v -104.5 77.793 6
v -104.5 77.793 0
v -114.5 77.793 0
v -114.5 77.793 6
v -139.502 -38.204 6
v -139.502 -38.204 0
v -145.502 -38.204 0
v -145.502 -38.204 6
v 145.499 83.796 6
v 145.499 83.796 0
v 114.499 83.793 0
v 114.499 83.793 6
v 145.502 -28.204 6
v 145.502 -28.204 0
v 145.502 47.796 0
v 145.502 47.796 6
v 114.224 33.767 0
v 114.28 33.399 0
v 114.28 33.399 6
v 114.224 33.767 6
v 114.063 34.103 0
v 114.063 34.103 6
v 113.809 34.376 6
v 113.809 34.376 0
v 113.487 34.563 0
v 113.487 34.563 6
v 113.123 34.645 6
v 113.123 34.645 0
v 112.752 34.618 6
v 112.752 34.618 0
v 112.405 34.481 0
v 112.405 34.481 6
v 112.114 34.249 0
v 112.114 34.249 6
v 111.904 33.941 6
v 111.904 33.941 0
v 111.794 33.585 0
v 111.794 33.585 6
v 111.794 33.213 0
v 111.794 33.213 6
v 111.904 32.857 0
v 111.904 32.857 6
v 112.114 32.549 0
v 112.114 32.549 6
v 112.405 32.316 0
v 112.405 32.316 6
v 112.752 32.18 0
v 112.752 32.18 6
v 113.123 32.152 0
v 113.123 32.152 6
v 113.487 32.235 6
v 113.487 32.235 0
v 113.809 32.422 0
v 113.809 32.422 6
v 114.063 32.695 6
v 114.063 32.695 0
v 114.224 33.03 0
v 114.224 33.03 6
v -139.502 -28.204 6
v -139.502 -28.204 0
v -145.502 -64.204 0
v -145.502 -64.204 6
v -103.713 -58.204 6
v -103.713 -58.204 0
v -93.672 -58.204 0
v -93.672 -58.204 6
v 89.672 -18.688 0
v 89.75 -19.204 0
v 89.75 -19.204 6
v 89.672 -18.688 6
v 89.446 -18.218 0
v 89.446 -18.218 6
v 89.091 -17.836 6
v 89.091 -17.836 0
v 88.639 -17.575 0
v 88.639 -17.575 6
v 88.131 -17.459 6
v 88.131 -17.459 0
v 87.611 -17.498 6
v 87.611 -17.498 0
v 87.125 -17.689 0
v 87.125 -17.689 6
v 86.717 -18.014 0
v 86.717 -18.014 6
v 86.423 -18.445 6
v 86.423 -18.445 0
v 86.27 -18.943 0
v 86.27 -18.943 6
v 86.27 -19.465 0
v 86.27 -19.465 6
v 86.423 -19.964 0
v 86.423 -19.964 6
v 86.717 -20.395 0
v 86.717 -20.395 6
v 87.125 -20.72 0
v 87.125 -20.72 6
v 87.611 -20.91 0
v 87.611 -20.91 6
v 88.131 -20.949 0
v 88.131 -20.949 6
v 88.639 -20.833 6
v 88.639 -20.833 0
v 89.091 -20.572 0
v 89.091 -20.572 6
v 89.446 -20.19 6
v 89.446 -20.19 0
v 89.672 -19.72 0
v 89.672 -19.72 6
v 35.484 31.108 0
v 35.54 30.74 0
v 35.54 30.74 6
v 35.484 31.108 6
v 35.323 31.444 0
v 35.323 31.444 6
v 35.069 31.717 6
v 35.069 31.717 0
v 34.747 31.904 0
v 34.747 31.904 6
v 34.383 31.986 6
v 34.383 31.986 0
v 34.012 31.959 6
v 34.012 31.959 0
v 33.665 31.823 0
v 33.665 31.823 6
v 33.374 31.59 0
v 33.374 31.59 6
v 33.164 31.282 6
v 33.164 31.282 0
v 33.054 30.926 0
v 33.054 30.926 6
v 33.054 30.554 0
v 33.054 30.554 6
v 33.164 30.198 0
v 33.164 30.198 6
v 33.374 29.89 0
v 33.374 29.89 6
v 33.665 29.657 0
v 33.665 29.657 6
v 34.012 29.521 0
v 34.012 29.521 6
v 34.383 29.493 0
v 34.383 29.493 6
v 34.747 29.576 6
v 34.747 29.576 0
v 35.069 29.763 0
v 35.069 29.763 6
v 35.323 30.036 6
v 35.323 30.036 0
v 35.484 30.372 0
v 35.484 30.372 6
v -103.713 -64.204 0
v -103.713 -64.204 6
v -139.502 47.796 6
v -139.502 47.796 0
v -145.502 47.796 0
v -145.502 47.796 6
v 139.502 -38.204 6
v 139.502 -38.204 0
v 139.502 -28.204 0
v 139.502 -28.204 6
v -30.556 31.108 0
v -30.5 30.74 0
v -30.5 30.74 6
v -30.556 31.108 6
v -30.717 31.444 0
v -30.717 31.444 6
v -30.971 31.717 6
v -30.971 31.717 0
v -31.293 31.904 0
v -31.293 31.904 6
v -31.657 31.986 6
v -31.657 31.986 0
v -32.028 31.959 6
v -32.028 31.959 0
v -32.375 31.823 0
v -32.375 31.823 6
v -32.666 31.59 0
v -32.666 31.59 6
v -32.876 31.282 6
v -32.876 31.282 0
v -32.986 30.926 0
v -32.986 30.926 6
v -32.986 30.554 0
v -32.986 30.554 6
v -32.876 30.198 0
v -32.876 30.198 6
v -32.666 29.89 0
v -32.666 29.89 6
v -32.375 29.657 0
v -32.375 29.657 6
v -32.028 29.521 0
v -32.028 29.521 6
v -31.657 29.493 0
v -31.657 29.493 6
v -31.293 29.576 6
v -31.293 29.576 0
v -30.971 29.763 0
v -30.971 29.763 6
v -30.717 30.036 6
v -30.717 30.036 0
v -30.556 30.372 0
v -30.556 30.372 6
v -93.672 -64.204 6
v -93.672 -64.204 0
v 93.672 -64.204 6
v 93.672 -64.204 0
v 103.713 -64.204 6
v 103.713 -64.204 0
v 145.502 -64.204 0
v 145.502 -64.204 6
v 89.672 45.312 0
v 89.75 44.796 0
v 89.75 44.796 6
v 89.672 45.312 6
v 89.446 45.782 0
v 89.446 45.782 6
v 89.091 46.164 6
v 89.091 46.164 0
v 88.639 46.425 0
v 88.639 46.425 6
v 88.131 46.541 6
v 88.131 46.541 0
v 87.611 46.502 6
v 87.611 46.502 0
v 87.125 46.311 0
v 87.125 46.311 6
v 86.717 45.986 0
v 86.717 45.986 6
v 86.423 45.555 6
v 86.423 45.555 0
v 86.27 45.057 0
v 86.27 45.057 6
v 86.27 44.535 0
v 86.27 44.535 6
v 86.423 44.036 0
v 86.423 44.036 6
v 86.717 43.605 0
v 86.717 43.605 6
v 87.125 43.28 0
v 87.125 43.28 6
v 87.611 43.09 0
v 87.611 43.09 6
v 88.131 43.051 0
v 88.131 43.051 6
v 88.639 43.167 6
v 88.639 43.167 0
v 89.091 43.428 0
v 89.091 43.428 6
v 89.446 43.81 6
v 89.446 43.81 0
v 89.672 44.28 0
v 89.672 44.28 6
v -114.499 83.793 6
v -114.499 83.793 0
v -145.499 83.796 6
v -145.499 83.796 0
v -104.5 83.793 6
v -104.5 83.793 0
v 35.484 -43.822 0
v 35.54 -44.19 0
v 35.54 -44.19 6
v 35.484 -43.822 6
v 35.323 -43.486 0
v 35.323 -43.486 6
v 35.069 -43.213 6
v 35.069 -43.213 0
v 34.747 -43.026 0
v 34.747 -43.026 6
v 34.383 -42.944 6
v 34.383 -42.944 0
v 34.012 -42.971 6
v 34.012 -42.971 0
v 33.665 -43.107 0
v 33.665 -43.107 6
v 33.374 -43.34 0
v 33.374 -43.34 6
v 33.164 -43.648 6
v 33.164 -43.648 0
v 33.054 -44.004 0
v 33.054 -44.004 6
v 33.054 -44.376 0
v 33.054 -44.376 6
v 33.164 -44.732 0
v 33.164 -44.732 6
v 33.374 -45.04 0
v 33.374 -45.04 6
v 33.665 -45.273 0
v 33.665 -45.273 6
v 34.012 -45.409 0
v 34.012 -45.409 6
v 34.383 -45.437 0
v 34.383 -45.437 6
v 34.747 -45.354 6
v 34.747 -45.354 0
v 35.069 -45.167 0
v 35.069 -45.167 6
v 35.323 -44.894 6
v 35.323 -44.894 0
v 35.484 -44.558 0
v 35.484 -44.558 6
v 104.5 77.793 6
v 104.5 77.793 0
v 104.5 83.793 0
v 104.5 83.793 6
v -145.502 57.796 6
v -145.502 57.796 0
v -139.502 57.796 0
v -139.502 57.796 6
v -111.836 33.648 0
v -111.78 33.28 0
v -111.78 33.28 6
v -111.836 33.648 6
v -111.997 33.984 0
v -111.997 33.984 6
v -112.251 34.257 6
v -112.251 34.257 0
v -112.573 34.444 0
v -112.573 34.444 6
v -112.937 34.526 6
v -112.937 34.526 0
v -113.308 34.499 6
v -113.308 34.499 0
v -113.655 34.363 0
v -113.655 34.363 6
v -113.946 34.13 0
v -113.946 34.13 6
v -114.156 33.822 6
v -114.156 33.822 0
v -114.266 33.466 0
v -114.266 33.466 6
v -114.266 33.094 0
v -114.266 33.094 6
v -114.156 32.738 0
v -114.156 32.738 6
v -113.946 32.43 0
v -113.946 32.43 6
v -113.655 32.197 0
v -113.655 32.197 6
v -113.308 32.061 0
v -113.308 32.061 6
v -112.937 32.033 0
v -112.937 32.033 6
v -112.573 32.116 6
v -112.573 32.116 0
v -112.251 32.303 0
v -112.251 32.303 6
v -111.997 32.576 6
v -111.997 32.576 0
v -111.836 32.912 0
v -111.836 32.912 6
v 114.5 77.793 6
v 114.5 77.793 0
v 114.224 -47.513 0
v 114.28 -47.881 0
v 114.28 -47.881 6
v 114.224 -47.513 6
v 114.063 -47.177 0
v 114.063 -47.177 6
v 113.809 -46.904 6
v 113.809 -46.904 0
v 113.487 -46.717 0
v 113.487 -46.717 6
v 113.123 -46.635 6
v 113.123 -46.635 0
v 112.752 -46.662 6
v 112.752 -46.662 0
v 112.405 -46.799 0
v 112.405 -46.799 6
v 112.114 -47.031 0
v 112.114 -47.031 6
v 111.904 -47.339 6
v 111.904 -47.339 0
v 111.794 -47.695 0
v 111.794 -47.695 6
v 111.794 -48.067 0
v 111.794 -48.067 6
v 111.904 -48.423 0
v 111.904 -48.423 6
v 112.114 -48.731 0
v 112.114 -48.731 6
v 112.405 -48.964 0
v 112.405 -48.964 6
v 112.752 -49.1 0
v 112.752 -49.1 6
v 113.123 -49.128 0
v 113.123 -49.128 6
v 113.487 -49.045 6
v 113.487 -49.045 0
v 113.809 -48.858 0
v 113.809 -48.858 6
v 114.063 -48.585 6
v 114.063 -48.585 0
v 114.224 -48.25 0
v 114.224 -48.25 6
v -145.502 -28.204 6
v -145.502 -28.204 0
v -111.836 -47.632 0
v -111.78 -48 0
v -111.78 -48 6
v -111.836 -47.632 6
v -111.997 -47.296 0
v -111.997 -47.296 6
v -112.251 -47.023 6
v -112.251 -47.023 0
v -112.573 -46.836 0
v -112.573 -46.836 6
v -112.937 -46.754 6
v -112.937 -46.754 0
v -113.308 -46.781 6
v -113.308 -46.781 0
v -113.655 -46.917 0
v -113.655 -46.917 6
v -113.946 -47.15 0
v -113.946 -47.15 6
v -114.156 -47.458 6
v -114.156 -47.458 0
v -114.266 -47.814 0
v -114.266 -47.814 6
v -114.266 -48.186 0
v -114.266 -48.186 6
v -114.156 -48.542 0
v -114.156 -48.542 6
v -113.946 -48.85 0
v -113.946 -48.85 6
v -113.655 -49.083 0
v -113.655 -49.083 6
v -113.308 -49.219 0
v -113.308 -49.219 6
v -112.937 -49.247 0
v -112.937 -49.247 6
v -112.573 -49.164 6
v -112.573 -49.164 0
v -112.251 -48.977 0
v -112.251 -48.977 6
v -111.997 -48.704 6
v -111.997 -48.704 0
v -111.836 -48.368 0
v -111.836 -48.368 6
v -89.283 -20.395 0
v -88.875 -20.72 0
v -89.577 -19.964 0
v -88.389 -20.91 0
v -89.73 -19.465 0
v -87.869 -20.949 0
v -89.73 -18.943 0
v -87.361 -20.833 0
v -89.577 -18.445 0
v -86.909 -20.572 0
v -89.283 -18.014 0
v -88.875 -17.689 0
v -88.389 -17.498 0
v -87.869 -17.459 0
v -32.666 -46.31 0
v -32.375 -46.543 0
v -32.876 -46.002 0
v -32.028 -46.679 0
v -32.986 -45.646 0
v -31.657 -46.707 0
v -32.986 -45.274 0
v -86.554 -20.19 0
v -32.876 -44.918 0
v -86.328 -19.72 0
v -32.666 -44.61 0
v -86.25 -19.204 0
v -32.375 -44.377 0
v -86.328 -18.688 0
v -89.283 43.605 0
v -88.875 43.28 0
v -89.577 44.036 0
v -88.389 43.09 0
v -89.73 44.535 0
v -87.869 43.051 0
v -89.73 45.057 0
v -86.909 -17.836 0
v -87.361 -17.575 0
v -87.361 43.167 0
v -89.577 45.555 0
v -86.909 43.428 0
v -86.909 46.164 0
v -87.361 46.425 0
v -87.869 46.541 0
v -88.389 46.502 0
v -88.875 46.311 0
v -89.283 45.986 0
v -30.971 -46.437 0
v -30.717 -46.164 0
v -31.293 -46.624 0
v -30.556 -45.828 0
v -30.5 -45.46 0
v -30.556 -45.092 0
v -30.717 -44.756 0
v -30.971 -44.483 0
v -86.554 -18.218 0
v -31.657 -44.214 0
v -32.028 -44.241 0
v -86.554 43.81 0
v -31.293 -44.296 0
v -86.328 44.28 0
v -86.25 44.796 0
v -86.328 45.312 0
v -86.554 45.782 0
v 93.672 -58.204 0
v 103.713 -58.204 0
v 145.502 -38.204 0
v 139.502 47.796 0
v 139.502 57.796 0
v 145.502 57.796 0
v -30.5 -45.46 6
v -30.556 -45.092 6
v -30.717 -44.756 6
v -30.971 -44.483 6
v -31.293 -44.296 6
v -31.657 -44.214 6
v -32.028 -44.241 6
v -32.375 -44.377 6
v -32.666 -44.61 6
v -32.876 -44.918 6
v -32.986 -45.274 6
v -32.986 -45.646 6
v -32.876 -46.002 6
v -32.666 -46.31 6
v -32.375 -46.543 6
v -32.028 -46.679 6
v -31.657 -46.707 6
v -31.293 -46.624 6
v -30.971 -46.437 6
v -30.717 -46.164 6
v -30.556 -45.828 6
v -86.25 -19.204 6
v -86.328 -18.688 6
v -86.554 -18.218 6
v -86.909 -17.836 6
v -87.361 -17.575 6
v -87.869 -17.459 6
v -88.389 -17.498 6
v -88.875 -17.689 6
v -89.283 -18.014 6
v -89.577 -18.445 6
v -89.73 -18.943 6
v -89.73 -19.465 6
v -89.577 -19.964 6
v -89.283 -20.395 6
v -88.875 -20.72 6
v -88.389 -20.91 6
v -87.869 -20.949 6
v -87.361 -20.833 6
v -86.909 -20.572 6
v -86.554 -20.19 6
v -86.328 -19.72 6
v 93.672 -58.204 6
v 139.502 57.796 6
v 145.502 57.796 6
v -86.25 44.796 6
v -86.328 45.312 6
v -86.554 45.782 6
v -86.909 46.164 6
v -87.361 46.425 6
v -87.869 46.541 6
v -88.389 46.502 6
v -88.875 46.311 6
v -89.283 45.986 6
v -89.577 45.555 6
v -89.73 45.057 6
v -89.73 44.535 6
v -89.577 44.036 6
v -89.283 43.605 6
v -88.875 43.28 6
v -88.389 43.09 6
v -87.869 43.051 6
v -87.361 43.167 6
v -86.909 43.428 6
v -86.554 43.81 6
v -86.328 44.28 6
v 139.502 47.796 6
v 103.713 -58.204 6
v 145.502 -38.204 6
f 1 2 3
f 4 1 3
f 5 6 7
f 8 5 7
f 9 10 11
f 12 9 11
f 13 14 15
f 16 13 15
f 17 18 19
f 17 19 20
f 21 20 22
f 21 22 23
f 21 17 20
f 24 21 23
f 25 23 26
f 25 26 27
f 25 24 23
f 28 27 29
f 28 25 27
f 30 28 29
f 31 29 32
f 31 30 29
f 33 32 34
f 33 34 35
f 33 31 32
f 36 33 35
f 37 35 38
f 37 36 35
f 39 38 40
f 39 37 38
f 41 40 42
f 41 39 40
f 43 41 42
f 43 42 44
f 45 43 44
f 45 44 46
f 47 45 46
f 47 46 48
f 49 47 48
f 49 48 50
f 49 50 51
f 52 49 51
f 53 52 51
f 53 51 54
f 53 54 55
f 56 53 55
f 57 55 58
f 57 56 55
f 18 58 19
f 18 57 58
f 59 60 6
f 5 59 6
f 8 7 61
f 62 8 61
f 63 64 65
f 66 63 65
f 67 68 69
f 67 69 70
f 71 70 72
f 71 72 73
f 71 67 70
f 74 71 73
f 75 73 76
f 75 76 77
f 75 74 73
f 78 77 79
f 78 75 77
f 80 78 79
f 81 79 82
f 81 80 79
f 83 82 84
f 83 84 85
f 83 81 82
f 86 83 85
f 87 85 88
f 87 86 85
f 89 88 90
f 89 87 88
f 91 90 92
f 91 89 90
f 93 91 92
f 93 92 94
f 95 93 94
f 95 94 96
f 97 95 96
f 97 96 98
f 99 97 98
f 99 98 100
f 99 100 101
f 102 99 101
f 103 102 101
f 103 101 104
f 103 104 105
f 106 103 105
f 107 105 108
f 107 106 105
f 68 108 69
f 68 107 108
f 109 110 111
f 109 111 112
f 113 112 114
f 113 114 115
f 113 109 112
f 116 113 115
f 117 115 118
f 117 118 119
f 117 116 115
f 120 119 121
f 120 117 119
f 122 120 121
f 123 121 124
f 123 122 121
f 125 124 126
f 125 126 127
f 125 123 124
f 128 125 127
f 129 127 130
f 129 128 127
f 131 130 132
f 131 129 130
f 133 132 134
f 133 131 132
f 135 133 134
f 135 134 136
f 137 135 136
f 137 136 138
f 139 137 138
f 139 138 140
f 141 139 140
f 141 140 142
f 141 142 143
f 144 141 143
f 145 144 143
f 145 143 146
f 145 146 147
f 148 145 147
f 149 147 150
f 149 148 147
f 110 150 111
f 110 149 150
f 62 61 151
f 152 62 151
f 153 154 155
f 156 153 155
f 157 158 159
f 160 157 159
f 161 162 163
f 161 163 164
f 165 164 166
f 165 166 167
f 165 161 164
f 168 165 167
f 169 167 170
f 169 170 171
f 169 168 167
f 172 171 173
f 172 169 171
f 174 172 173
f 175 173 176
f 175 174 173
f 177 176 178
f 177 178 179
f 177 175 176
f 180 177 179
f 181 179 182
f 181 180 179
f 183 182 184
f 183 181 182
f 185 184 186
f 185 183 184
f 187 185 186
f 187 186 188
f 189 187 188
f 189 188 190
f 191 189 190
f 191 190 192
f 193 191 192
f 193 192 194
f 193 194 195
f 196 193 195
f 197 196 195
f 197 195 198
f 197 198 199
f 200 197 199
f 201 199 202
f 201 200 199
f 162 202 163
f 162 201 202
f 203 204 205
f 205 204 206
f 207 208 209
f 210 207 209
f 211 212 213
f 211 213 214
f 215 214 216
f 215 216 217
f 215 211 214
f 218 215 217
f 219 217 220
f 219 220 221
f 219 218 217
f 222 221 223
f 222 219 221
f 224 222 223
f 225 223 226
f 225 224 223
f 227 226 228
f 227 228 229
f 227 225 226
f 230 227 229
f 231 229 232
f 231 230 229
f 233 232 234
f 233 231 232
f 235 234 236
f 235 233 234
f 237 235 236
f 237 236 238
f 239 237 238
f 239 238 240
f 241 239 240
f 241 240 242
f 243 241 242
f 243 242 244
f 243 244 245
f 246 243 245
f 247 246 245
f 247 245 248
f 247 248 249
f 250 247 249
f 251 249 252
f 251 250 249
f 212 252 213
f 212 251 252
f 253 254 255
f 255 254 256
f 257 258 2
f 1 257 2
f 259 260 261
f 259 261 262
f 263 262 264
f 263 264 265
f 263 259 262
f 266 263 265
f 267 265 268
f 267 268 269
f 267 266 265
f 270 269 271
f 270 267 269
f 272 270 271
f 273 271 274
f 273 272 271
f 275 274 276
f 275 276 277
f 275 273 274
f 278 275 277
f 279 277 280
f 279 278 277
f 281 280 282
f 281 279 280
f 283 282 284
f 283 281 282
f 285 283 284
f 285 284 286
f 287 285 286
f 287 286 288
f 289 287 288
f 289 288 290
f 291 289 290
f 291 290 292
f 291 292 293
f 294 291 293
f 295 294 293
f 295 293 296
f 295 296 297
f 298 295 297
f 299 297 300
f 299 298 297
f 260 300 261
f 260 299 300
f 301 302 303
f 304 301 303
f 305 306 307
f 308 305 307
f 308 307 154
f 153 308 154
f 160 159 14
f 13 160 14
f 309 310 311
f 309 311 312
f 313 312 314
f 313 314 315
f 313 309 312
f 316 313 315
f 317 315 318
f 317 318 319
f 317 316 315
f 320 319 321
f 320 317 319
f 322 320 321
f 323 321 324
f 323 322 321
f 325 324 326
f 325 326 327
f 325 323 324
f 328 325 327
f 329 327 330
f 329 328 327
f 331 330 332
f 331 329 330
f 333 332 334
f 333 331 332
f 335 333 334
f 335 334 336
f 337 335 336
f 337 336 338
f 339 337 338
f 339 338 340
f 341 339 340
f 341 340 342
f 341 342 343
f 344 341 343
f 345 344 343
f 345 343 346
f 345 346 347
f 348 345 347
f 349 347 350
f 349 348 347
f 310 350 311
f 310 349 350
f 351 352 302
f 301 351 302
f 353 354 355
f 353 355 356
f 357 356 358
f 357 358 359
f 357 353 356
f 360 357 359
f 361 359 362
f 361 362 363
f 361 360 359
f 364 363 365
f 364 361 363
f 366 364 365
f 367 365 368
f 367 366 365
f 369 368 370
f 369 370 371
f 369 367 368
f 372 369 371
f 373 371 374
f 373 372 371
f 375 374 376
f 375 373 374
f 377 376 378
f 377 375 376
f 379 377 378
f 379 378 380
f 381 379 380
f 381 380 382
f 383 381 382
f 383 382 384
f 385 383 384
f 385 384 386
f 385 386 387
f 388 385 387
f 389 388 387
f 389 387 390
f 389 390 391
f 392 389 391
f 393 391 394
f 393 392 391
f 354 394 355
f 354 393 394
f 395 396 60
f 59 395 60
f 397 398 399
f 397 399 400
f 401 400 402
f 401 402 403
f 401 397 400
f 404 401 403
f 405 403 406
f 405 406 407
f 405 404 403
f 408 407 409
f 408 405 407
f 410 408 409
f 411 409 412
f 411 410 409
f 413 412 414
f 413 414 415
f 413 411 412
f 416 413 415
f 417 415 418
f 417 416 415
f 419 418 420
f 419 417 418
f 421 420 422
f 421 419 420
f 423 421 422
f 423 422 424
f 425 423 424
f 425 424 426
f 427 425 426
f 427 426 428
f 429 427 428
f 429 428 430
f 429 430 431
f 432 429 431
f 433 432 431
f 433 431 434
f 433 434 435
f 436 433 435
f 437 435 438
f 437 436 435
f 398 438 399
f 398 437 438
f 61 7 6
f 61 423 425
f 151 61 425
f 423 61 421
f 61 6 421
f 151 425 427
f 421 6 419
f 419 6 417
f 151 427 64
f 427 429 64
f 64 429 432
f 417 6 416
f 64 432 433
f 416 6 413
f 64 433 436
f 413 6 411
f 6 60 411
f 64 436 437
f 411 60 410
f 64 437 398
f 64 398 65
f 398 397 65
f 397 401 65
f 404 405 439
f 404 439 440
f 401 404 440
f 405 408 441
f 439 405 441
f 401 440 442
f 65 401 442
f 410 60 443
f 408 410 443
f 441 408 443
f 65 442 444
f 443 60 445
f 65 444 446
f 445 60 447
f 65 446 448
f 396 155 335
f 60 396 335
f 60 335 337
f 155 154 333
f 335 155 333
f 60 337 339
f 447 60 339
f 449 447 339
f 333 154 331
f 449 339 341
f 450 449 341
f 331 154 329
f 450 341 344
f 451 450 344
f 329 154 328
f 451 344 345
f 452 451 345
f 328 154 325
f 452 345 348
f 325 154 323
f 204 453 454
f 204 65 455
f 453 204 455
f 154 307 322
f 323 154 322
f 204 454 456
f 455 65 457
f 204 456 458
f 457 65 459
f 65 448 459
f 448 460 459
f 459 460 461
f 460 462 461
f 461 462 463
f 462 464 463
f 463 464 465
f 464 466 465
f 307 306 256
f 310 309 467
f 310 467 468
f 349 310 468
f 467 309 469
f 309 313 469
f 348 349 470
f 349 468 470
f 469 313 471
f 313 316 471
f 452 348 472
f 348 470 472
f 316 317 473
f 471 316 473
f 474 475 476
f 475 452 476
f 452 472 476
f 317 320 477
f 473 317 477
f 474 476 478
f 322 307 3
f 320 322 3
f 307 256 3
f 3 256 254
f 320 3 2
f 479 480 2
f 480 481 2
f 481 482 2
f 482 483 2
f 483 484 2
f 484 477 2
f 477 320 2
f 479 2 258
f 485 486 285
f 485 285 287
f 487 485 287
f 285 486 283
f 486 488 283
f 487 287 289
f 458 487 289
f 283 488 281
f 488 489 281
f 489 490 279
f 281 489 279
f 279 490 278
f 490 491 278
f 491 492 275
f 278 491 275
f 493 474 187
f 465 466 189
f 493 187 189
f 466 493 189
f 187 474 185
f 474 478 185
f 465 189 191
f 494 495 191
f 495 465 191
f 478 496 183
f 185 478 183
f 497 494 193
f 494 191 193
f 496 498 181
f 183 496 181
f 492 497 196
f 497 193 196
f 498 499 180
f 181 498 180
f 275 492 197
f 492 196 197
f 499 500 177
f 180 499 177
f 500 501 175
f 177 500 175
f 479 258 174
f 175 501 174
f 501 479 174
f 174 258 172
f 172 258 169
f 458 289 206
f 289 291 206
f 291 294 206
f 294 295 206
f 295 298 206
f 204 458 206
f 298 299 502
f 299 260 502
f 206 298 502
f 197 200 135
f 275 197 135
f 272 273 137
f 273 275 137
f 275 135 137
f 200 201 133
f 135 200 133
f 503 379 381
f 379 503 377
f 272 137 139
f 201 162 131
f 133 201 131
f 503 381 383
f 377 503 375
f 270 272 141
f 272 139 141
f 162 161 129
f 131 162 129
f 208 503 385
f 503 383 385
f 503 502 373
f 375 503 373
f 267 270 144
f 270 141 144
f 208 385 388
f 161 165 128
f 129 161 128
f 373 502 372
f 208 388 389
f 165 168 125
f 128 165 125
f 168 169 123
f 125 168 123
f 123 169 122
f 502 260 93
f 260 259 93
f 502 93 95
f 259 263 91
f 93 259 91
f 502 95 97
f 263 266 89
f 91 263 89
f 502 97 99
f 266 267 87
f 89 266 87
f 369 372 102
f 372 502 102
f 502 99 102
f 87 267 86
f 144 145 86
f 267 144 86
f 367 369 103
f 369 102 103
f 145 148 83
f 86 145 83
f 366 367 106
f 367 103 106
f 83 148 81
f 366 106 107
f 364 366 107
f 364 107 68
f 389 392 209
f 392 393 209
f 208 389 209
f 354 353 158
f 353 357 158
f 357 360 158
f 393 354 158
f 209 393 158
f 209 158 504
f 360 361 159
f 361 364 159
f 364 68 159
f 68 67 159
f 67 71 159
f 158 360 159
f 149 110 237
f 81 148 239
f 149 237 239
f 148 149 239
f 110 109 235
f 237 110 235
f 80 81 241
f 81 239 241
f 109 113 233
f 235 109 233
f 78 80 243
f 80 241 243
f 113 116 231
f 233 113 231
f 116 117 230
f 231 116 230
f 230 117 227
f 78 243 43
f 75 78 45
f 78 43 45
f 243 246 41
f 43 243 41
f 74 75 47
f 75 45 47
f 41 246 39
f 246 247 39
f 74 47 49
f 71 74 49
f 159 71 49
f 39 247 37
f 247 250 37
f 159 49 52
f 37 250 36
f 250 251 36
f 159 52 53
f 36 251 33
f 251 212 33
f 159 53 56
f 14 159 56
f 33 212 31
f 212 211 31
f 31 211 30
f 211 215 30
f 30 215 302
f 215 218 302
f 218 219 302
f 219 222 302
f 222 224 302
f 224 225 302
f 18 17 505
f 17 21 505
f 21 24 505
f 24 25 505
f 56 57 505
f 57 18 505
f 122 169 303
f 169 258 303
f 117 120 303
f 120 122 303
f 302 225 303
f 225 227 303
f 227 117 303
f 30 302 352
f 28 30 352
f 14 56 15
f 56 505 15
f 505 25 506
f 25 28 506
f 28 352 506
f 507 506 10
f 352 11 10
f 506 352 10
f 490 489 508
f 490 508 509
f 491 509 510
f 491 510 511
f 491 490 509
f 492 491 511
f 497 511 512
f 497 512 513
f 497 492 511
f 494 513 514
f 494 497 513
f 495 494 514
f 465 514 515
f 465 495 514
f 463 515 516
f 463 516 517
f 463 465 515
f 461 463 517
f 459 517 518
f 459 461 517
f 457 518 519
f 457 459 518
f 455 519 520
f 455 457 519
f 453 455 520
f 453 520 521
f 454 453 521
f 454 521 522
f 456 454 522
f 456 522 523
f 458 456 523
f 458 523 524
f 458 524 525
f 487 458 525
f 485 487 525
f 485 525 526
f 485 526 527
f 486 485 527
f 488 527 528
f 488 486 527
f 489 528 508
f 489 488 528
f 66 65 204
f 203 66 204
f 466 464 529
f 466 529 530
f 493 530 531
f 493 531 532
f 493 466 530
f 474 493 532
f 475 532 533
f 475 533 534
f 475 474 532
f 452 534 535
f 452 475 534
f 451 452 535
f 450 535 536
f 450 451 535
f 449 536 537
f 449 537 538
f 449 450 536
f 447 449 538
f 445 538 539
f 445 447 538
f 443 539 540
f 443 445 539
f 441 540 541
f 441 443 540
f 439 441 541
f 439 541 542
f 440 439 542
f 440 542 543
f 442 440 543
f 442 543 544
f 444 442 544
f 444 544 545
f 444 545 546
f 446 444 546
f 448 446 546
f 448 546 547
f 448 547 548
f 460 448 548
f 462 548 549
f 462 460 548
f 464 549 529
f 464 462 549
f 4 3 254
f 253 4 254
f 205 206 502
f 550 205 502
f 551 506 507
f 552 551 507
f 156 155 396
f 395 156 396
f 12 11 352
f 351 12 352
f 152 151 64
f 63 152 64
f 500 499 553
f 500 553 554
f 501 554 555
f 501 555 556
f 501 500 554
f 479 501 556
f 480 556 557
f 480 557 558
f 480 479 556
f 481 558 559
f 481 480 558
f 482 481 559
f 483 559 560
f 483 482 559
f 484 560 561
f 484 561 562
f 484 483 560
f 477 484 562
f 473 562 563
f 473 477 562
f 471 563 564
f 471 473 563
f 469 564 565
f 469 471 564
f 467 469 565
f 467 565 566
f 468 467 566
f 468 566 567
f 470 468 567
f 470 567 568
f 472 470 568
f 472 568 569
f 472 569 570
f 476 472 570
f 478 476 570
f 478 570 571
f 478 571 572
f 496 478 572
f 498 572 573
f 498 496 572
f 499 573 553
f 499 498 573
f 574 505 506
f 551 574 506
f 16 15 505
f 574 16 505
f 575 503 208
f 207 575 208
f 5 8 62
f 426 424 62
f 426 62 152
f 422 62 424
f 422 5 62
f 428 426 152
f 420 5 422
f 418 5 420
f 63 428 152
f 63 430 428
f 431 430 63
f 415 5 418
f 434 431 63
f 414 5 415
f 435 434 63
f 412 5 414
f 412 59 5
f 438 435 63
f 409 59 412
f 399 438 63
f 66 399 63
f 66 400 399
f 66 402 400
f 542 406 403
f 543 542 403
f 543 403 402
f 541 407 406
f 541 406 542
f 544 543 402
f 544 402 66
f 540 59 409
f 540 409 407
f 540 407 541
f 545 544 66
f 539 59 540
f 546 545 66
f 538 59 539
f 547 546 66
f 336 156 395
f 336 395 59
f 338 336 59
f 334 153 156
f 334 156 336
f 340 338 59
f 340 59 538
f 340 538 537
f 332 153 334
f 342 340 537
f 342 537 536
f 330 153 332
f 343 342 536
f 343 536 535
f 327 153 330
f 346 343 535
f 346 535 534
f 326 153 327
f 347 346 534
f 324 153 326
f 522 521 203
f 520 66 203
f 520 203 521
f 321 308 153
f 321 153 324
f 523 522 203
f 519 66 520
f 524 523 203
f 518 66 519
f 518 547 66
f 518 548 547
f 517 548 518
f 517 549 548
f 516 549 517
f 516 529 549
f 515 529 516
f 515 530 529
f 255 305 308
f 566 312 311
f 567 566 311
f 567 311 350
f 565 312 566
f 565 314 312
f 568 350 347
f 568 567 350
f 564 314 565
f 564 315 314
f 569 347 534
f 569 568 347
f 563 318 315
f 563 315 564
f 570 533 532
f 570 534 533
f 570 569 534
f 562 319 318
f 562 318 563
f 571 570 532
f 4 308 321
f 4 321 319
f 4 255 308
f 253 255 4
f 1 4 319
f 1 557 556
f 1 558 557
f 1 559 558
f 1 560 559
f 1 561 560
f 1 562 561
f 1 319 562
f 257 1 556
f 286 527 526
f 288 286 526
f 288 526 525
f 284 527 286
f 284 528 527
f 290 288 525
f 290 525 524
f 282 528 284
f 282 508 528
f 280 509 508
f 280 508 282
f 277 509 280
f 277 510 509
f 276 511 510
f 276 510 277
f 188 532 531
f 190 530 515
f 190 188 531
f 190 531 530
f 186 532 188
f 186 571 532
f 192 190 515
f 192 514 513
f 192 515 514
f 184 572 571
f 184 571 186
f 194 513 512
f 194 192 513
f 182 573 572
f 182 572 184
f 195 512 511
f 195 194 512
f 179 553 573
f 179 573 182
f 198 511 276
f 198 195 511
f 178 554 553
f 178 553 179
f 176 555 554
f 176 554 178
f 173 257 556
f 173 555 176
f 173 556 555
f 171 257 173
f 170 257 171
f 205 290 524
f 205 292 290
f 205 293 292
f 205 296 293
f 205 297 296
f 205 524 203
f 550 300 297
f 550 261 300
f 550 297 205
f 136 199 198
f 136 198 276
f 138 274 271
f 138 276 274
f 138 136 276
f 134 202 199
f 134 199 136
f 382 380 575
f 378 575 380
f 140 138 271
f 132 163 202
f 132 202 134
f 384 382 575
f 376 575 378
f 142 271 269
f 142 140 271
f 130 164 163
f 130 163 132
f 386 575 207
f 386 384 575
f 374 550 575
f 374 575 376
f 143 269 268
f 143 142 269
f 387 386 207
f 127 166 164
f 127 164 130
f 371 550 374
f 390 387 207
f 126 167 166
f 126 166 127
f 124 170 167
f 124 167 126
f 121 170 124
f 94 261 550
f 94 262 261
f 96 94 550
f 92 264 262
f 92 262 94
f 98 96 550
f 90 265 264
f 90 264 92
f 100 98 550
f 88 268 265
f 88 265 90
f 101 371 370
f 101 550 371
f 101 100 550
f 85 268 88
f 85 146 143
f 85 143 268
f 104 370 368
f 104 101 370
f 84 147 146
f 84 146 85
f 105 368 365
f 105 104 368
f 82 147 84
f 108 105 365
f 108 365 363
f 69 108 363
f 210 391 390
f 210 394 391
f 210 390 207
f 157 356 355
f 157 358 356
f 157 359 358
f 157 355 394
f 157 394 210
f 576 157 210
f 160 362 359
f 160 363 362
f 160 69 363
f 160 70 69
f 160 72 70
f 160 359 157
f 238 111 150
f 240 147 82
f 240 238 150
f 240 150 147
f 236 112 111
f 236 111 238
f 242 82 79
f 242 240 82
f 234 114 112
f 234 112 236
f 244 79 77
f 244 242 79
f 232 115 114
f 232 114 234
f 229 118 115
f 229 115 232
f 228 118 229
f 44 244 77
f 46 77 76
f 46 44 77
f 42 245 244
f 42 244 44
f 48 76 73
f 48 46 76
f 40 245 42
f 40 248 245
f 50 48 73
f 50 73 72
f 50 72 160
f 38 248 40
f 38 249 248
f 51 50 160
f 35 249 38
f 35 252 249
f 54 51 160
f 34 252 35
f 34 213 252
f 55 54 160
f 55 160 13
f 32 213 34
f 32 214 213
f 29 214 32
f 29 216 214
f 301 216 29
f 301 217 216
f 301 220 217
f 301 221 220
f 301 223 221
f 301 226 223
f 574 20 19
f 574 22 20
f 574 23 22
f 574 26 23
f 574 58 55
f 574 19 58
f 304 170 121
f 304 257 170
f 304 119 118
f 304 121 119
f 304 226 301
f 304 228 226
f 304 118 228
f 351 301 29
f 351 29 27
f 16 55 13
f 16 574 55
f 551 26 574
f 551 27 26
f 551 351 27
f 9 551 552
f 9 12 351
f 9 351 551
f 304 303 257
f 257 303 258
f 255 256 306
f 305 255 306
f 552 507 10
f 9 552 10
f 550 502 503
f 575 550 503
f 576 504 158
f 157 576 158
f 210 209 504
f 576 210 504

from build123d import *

# Parameters (mm, degrees)
F0_R     = 1.25
F0_R_2   = 1.75
F1_DEPTH = 6


# Not quite as in the source:
# - a feature names something its author has since deleted; it is built from what else it names


with BuildPart() as f1:
    # F0 (on Top) → F1 (new body)
    with BuildSketch(Plane.XY):
        Polygon((145.5019380654, -28.2040820618), (145.5019380654, 47.7959179382), (139.5019380654, 47.7959179382), (139.5019380654, 57.7961117593), (145.5019380654, 57.7961117593), (145.4994183911, 83.7961116372), (114.4994185367, 83.7931074102), (114.5, 77.7931074384), (104.5, 77.7931074384), (104.5, 83.793107429), (0, 83.793107429), (-104.5, 83.793107429), (-104.5, 77.7931074384), (-114.5, 77.7931074384), (-114.4994185367, 83.7931074102), (-145.4994183911, 83.7961116372), (-145.5019380654, 57.7961117593), (-139.5019380654, 57.7961117593), (-139.5019380654, 47.7959179382), (-145.5019380654, 47.7959179382), (-145.5019380654, -28.2040820618), (-139.5019380654, -28.2040820618), (-139.5019380654, -38.2040820618), (-145.5019380652, -38.2041248082), (-145.5019380652, -64.2040820618), (-103.7128691326, -64.2040817458), (-103.7128691326, -58.2040817458), (-93.6722421218, -58.2040816699), (-93.6722421218, -64.2042880704), (-4.2916e-06, -64.2042880704), (93.6722421218, -64.2042880704), (93.6722421218, -58.2040816699), (103.7128691326, -58.2040817458), (103.7128691326, -64.2040817458), (145.5019380652, -64.2040820618), (145.5019380652, -38.2041248082), (139.5019380654, -38.2040820618), (139.5019380654, -28.2040820618), align=None)
        with Locations((-113.03, -48.0000058421)):
            Circle(F0_R, mode=Mode.SUBTRACT)
        with Locations((-31.75, -45.4600058421)):
            Circle(F0_R, mode=Mode.SUBTRACT)
        with Locations((-88, -19.2042880704)):
            Circle(F0_R_2, mode=Mode.SUBTRACT)
        with Locations((34.29, -44.1900058421)):
            Circle(F0_R, mode=Mode.SUBTRACT)
        with Locations((113.03, -47.8810681991)):
            Circle(F0_R, mode=Mode.SUBTRACT)
        with Locations((88, -19.2042880704)):
            Circle(F0_R_2, mode=Mode.SUBTRACT)
        with Locations((-113.03, 33.2799941579)):
            Circle(F0_R, mode=Mode.SUBTRACT)
        with Locations((-88, 44.7957119296)):
            Circle(F0_R_2, mode=Mode.SUBTRACT)
        with Locations((-31.75, 30.7399941579)):
            Circle(F0_R, mode=Mode.SUBTRACT)
        with Locations((34.29, 30.7399941579)):
            Circle(F0_R, mode=Mode.SUBTRACT)
        with Locations((88, 44.7957119296)):
            Circle(F0_R_2, mode=Mode.SUBTRACT)
        with Locations((113.03, 33.3989318009)):
            Circle(F0_R, mode=Mode.SUBTRACT)
    extrude(amount=F1_DEPTH)


solid = f1.part
